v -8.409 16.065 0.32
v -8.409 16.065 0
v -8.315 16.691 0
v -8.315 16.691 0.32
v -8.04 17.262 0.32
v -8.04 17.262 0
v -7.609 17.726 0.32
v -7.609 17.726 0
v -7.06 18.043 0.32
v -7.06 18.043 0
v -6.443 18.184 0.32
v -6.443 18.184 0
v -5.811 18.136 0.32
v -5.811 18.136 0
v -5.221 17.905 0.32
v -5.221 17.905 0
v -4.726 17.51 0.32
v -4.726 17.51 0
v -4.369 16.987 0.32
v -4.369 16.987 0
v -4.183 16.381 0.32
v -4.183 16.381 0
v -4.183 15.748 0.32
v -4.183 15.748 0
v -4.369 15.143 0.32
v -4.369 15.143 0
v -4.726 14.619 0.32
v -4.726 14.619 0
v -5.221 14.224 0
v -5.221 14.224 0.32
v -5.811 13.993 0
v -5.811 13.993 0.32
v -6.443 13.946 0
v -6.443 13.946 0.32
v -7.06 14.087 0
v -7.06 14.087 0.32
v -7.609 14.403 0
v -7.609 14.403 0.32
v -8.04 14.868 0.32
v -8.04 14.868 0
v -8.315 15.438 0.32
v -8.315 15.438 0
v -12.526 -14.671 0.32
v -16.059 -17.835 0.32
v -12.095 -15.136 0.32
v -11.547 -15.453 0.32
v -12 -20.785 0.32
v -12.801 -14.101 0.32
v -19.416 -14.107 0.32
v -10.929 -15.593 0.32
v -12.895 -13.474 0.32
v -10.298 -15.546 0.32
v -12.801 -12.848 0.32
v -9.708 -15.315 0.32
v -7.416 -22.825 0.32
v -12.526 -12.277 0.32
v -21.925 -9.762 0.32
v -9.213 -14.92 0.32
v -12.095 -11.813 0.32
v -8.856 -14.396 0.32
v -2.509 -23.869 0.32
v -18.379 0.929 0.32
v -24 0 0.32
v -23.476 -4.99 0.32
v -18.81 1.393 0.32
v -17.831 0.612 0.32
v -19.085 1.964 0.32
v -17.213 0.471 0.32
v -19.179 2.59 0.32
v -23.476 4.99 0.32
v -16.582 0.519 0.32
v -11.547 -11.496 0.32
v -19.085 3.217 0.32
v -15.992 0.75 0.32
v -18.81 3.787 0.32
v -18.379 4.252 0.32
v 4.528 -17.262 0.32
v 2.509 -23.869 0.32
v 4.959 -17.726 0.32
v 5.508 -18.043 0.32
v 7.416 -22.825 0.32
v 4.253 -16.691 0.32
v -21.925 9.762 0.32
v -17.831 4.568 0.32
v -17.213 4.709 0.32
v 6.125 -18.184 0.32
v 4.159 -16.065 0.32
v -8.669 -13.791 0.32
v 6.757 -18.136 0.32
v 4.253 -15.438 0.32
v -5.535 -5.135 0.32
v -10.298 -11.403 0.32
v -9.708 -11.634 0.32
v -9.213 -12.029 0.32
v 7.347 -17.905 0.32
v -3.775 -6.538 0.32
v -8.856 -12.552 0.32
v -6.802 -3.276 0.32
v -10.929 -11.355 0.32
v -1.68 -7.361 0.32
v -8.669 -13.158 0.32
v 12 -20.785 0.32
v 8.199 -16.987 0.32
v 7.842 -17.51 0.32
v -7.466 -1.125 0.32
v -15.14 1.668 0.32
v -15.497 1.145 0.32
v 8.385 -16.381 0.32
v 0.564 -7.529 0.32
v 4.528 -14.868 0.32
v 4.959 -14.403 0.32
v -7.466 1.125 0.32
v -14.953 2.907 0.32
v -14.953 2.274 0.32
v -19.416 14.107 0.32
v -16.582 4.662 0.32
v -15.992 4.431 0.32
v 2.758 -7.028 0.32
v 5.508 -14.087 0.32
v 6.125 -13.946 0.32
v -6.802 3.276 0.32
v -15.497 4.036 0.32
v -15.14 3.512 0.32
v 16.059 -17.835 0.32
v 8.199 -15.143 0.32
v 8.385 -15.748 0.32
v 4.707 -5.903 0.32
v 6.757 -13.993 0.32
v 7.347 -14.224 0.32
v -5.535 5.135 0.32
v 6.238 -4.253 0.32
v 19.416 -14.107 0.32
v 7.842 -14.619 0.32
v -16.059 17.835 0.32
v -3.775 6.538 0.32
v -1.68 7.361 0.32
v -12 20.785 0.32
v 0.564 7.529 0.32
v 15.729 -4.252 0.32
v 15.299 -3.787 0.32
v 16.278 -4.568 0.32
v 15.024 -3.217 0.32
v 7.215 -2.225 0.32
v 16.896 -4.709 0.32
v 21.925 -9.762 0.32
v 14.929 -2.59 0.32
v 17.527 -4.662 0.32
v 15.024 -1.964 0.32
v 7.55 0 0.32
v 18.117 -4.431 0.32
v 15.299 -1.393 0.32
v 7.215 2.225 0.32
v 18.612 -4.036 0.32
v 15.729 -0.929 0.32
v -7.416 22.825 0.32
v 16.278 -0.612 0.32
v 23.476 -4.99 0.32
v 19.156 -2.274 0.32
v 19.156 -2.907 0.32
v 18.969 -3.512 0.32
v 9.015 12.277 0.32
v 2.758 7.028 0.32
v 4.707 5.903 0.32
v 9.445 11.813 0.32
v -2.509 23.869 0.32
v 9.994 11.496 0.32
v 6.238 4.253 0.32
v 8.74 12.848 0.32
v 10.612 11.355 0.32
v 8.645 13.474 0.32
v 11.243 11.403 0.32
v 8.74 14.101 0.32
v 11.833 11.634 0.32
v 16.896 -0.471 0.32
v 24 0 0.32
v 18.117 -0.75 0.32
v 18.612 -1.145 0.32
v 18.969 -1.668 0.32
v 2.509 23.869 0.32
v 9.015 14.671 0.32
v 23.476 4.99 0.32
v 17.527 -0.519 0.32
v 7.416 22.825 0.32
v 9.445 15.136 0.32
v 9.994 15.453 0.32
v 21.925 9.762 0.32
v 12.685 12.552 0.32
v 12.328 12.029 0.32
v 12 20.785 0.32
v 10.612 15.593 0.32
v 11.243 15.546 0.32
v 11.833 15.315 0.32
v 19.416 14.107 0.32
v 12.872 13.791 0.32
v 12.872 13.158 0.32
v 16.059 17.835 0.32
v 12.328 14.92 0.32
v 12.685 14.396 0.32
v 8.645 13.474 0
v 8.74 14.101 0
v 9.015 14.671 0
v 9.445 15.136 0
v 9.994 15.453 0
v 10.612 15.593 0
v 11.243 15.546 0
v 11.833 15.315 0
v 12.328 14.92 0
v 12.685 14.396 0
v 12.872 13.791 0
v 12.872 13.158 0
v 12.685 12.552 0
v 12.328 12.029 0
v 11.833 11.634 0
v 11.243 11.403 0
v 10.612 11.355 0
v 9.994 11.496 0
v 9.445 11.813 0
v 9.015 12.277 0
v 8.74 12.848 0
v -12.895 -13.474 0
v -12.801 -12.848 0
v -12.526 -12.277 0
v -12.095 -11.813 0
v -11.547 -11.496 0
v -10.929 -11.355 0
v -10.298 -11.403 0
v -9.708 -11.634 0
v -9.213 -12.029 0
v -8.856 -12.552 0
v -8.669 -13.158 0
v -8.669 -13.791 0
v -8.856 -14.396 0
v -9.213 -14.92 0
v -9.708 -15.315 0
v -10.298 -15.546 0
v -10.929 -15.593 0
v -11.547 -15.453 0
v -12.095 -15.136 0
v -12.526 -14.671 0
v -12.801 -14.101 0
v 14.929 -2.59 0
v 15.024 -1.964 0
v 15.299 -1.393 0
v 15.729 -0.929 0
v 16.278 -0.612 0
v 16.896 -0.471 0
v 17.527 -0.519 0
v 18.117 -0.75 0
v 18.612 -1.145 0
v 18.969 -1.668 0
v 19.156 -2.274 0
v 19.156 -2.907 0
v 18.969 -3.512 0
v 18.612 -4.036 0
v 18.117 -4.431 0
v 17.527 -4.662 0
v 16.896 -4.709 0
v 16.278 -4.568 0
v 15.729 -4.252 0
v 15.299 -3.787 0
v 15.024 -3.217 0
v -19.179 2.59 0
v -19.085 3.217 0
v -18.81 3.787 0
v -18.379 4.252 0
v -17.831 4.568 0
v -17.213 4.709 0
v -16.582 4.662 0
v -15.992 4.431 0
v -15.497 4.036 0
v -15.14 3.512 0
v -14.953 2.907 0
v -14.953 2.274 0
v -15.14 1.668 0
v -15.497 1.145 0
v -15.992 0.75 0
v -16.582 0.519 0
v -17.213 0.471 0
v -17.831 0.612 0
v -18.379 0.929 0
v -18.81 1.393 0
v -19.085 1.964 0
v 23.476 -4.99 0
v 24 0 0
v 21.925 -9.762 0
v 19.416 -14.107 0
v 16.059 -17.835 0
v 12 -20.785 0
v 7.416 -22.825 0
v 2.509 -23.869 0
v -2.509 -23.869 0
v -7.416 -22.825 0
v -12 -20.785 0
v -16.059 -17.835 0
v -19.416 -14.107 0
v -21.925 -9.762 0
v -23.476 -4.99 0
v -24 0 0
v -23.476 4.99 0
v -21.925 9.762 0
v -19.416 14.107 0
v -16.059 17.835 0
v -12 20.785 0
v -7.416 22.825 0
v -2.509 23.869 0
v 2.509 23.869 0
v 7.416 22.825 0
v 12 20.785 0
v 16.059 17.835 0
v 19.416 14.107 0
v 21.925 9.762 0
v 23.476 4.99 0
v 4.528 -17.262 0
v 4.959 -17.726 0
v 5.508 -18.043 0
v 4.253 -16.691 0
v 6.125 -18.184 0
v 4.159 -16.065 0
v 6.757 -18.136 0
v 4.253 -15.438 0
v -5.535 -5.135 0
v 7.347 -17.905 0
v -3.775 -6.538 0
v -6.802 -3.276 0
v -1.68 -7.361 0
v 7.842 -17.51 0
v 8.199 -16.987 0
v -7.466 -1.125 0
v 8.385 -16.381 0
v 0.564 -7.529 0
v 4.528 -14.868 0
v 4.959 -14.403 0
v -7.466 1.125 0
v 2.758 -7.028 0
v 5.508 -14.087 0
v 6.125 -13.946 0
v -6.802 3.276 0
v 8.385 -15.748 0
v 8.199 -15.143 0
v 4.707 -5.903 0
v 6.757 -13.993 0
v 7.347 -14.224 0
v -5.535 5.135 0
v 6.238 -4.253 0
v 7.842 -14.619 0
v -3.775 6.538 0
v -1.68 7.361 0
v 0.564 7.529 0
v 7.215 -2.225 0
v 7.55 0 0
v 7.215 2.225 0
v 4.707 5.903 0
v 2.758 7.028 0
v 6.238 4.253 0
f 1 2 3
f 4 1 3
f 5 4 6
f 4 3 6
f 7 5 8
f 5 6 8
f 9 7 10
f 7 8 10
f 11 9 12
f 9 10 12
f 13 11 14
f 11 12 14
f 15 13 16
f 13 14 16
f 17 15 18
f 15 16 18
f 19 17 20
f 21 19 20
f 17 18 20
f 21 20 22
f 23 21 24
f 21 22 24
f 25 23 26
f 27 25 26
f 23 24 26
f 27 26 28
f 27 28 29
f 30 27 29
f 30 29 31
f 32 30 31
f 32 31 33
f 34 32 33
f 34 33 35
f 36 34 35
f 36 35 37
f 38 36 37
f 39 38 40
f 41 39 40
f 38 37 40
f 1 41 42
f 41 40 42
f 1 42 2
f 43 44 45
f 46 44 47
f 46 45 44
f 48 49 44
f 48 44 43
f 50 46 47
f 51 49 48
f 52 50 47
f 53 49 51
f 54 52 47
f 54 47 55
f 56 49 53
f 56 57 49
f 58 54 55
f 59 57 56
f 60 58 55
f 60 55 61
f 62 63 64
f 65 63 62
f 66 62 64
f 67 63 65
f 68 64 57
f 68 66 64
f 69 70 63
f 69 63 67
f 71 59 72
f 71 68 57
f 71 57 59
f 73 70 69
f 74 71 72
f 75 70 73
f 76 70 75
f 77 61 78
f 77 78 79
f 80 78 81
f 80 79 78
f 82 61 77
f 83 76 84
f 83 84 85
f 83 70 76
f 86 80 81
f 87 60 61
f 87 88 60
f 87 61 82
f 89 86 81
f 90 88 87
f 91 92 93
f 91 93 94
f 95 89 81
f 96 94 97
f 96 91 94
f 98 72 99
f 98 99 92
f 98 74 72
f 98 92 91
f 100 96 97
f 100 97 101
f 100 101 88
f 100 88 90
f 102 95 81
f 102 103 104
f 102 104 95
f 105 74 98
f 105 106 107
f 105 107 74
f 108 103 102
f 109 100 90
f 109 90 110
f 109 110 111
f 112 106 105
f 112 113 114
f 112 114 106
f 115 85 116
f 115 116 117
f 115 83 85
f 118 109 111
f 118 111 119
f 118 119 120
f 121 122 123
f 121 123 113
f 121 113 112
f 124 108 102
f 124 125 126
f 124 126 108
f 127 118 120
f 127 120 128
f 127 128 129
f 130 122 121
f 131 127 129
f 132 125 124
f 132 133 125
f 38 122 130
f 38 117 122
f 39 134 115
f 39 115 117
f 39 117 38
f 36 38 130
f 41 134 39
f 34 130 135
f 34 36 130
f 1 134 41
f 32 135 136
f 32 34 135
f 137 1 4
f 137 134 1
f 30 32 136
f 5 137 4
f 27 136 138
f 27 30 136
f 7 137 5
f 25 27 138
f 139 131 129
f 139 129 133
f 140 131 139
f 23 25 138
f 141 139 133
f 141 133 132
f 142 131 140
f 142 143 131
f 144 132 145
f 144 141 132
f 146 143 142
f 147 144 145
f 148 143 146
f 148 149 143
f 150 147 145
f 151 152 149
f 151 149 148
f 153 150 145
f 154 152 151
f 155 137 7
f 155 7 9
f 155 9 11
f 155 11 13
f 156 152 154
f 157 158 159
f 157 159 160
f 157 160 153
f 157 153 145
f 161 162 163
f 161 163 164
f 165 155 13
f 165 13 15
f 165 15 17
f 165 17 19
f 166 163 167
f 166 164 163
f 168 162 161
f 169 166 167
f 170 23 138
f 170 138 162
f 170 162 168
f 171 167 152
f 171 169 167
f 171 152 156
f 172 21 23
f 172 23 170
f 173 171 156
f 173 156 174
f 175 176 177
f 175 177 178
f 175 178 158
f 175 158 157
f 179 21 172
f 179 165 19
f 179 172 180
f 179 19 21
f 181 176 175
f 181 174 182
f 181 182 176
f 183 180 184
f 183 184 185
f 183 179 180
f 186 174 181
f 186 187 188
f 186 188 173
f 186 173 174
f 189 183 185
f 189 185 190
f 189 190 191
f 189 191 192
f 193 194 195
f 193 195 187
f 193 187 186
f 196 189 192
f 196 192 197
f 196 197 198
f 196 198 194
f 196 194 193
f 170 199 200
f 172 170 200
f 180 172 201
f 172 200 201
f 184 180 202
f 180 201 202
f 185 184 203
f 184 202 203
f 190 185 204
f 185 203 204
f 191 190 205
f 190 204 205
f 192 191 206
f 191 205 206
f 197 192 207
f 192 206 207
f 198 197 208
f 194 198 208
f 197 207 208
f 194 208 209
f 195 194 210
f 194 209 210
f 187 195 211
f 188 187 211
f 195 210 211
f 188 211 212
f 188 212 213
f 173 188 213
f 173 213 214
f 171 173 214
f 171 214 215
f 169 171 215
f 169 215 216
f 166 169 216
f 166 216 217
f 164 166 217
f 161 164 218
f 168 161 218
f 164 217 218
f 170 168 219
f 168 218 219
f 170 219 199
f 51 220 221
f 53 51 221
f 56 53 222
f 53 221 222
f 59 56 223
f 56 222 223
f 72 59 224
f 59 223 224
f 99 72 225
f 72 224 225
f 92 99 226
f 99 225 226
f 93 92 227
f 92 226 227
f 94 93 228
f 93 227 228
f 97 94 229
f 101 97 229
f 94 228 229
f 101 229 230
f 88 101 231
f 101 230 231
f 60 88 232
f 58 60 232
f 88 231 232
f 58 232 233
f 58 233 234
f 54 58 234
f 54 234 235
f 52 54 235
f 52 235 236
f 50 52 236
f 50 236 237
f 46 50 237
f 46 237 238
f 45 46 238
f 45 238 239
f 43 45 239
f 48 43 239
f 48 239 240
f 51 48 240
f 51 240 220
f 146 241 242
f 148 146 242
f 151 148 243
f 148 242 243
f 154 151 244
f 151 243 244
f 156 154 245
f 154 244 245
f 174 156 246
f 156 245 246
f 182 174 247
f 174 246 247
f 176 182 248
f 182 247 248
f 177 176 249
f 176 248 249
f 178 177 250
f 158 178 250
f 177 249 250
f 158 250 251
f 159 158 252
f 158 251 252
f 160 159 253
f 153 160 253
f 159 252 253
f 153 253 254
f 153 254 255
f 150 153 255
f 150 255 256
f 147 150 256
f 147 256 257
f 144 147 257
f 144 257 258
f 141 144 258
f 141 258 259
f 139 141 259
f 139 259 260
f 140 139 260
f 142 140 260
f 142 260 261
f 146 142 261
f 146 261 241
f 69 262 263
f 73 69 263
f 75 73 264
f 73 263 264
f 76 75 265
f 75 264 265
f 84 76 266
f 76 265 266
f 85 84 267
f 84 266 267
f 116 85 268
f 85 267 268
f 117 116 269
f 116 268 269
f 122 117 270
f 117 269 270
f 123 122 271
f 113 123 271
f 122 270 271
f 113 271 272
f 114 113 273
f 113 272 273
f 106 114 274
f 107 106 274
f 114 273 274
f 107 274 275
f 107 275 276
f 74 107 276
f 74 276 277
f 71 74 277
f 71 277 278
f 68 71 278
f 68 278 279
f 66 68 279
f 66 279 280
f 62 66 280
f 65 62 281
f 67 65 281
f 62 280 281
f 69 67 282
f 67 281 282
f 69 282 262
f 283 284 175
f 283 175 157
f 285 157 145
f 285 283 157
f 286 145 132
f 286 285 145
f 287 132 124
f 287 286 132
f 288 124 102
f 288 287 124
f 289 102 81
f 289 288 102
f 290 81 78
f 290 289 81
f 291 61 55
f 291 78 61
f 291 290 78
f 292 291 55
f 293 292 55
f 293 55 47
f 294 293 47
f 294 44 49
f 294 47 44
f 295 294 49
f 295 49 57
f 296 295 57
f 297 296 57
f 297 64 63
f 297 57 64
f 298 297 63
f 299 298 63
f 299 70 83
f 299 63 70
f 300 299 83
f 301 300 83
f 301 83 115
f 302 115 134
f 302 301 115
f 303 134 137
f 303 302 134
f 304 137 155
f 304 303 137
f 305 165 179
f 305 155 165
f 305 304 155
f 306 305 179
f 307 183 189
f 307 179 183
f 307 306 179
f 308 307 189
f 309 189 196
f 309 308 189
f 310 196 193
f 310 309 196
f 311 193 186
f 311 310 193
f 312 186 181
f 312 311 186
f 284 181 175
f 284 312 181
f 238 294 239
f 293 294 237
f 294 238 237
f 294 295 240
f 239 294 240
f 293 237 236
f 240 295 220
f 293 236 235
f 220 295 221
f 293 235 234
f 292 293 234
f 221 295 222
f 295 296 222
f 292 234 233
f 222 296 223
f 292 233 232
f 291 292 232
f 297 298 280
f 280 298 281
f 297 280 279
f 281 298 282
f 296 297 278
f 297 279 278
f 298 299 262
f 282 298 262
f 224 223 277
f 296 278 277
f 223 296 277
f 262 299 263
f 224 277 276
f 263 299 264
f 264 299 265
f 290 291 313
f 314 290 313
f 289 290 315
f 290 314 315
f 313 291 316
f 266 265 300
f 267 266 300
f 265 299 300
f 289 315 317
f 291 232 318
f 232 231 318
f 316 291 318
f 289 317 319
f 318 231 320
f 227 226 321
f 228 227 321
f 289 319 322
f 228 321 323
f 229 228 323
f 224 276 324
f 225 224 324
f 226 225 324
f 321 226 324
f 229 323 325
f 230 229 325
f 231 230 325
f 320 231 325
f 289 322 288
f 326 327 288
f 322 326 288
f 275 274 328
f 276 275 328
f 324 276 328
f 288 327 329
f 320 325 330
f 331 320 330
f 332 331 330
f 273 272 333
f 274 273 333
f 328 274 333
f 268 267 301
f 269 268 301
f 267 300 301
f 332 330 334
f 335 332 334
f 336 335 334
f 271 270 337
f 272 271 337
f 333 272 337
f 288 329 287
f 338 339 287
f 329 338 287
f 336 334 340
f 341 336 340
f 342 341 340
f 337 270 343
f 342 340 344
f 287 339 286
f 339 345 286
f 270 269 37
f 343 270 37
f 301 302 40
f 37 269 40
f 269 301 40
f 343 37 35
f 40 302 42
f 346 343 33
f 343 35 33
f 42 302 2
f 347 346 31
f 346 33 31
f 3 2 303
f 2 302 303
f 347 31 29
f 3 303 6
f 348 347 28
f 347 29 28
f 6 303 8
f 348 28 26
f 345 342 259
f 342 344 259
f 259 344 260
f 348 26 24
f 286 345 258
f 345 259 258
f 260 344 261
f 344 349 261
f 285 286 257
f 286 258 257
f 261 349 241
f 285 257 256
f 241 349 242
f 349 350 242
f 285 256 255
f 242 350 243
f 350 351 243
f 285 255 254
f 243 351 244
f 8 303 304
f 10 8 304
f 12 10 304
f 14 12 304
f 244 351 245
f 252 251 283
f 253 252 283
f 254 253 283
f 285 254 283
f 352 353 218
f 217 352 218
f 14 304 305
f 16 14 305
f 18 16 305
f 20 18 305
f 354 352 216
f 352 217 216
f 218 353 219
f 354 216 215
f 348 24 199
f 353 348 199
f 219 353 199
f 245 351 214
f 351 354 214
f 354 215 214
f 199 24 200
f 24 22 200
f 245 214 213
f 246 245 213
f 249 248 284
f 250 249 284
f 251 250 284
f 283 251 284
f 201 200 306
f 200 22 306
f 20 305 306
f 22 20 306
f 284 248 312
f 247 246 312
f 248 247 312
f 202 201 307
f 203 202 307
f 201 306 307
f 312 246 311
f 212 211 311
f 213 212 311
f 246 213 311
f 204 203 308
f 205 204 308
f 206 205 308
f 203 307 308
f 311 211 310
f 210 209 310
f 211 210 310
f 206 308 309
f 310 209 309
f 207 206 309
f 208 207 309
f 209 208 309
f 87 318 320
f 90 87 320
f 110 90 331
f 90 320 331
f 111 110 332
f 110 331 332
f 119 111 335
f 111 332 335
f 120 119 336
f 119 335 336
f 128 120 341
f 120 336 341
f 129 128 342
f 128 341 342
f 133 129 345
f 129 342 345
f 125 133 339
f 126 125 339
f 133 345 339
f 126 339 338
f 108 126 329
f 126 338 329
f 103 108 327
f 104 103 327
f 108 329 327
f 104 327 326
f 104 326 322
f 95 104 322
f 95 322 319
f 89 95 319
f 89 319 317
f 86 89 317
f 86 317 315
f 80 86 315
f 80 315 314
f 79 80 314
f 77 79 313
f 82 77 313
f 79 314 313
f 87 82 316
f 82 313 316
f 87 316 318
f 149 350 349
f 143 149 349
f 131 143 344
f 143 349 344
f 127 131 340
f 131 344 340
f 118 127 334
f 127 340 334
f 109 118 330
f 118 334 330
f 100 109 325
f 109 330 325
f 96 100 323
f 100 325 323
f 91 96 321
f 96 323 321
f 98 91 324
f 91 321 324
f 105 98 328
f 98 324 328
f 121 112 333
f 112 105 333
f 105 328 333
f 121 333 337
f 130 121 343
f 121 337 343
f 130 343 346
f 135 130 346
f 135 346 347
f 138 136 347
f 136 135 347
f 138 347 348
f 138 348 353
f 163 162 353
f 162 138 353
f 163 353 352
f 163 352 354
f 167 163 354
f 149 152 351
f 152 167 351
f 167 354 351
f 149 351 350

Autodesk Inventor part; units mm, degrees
ref_plane "YZ Plane" through (0, 0, 0) normal (1, 0, 0) x (0, 1, 0)
ref_plane "XZ Plane" through (0, 0, 0) normal (0, 1, 0) x (-1, 0, 0)
ref_plane "XY Plane" through (0, 0, 0) normal (0, 0, 1) x (1, 0, 0)
sketch "Sketch1" plane through (0, 0, 0) normal (0, 0, 1) x (1, 0, 0)
  circle A0 centre (0, 0) radius 24
  circle A1 centre (0, 0) radius 7.55
  dimension "d0" = 48
  dimension "d1" = 15.1
extrude "Extrusion1" add sketch "Sketch1" along normal blind 0.32
sketch "Sketch2" plane through (0, 0, 0) normal (0, 0, -1) x (-1, 0, 0)
  circle A0 centre (-16.5319, -11.256) radius 2.05 projected
  circle A1 centre (-19.649, 3.7306) radius 2.05 projected
  circle A2 centre (-17.0544, -2.5903) radius 1.65 projected
  circle A3 centre (-6.284, -16.0647) radius 1.65 projected
  circle A4 centre (-6.284, -16.0647) radius 1.65
  circle A5 centre (-6.284, -16.0647) radius 2.125
  circle A6 centre (10.7704, -13.4744) radius 2.125
  circle A7 centre (17.0544, 2.5903) radius 2.125
  circle A8 centre (6.284, 16.0647) radius 2.125
  circle A9 centre (-10.7704, 13.4744) radius 2.125
  circle A10 centre (-17.0544, -2.5903) radius 2.125
  point P0 (0, 0)
  dimension "d4" = 4.25
  dimension "d7" = 360
extrude "Extrusion2" cut sketch "Sketch2" against normal through all contours A2 | A3 | A5 | A6 | A7 | A8 | A9 | A10
properties part number "spool_spacer"
